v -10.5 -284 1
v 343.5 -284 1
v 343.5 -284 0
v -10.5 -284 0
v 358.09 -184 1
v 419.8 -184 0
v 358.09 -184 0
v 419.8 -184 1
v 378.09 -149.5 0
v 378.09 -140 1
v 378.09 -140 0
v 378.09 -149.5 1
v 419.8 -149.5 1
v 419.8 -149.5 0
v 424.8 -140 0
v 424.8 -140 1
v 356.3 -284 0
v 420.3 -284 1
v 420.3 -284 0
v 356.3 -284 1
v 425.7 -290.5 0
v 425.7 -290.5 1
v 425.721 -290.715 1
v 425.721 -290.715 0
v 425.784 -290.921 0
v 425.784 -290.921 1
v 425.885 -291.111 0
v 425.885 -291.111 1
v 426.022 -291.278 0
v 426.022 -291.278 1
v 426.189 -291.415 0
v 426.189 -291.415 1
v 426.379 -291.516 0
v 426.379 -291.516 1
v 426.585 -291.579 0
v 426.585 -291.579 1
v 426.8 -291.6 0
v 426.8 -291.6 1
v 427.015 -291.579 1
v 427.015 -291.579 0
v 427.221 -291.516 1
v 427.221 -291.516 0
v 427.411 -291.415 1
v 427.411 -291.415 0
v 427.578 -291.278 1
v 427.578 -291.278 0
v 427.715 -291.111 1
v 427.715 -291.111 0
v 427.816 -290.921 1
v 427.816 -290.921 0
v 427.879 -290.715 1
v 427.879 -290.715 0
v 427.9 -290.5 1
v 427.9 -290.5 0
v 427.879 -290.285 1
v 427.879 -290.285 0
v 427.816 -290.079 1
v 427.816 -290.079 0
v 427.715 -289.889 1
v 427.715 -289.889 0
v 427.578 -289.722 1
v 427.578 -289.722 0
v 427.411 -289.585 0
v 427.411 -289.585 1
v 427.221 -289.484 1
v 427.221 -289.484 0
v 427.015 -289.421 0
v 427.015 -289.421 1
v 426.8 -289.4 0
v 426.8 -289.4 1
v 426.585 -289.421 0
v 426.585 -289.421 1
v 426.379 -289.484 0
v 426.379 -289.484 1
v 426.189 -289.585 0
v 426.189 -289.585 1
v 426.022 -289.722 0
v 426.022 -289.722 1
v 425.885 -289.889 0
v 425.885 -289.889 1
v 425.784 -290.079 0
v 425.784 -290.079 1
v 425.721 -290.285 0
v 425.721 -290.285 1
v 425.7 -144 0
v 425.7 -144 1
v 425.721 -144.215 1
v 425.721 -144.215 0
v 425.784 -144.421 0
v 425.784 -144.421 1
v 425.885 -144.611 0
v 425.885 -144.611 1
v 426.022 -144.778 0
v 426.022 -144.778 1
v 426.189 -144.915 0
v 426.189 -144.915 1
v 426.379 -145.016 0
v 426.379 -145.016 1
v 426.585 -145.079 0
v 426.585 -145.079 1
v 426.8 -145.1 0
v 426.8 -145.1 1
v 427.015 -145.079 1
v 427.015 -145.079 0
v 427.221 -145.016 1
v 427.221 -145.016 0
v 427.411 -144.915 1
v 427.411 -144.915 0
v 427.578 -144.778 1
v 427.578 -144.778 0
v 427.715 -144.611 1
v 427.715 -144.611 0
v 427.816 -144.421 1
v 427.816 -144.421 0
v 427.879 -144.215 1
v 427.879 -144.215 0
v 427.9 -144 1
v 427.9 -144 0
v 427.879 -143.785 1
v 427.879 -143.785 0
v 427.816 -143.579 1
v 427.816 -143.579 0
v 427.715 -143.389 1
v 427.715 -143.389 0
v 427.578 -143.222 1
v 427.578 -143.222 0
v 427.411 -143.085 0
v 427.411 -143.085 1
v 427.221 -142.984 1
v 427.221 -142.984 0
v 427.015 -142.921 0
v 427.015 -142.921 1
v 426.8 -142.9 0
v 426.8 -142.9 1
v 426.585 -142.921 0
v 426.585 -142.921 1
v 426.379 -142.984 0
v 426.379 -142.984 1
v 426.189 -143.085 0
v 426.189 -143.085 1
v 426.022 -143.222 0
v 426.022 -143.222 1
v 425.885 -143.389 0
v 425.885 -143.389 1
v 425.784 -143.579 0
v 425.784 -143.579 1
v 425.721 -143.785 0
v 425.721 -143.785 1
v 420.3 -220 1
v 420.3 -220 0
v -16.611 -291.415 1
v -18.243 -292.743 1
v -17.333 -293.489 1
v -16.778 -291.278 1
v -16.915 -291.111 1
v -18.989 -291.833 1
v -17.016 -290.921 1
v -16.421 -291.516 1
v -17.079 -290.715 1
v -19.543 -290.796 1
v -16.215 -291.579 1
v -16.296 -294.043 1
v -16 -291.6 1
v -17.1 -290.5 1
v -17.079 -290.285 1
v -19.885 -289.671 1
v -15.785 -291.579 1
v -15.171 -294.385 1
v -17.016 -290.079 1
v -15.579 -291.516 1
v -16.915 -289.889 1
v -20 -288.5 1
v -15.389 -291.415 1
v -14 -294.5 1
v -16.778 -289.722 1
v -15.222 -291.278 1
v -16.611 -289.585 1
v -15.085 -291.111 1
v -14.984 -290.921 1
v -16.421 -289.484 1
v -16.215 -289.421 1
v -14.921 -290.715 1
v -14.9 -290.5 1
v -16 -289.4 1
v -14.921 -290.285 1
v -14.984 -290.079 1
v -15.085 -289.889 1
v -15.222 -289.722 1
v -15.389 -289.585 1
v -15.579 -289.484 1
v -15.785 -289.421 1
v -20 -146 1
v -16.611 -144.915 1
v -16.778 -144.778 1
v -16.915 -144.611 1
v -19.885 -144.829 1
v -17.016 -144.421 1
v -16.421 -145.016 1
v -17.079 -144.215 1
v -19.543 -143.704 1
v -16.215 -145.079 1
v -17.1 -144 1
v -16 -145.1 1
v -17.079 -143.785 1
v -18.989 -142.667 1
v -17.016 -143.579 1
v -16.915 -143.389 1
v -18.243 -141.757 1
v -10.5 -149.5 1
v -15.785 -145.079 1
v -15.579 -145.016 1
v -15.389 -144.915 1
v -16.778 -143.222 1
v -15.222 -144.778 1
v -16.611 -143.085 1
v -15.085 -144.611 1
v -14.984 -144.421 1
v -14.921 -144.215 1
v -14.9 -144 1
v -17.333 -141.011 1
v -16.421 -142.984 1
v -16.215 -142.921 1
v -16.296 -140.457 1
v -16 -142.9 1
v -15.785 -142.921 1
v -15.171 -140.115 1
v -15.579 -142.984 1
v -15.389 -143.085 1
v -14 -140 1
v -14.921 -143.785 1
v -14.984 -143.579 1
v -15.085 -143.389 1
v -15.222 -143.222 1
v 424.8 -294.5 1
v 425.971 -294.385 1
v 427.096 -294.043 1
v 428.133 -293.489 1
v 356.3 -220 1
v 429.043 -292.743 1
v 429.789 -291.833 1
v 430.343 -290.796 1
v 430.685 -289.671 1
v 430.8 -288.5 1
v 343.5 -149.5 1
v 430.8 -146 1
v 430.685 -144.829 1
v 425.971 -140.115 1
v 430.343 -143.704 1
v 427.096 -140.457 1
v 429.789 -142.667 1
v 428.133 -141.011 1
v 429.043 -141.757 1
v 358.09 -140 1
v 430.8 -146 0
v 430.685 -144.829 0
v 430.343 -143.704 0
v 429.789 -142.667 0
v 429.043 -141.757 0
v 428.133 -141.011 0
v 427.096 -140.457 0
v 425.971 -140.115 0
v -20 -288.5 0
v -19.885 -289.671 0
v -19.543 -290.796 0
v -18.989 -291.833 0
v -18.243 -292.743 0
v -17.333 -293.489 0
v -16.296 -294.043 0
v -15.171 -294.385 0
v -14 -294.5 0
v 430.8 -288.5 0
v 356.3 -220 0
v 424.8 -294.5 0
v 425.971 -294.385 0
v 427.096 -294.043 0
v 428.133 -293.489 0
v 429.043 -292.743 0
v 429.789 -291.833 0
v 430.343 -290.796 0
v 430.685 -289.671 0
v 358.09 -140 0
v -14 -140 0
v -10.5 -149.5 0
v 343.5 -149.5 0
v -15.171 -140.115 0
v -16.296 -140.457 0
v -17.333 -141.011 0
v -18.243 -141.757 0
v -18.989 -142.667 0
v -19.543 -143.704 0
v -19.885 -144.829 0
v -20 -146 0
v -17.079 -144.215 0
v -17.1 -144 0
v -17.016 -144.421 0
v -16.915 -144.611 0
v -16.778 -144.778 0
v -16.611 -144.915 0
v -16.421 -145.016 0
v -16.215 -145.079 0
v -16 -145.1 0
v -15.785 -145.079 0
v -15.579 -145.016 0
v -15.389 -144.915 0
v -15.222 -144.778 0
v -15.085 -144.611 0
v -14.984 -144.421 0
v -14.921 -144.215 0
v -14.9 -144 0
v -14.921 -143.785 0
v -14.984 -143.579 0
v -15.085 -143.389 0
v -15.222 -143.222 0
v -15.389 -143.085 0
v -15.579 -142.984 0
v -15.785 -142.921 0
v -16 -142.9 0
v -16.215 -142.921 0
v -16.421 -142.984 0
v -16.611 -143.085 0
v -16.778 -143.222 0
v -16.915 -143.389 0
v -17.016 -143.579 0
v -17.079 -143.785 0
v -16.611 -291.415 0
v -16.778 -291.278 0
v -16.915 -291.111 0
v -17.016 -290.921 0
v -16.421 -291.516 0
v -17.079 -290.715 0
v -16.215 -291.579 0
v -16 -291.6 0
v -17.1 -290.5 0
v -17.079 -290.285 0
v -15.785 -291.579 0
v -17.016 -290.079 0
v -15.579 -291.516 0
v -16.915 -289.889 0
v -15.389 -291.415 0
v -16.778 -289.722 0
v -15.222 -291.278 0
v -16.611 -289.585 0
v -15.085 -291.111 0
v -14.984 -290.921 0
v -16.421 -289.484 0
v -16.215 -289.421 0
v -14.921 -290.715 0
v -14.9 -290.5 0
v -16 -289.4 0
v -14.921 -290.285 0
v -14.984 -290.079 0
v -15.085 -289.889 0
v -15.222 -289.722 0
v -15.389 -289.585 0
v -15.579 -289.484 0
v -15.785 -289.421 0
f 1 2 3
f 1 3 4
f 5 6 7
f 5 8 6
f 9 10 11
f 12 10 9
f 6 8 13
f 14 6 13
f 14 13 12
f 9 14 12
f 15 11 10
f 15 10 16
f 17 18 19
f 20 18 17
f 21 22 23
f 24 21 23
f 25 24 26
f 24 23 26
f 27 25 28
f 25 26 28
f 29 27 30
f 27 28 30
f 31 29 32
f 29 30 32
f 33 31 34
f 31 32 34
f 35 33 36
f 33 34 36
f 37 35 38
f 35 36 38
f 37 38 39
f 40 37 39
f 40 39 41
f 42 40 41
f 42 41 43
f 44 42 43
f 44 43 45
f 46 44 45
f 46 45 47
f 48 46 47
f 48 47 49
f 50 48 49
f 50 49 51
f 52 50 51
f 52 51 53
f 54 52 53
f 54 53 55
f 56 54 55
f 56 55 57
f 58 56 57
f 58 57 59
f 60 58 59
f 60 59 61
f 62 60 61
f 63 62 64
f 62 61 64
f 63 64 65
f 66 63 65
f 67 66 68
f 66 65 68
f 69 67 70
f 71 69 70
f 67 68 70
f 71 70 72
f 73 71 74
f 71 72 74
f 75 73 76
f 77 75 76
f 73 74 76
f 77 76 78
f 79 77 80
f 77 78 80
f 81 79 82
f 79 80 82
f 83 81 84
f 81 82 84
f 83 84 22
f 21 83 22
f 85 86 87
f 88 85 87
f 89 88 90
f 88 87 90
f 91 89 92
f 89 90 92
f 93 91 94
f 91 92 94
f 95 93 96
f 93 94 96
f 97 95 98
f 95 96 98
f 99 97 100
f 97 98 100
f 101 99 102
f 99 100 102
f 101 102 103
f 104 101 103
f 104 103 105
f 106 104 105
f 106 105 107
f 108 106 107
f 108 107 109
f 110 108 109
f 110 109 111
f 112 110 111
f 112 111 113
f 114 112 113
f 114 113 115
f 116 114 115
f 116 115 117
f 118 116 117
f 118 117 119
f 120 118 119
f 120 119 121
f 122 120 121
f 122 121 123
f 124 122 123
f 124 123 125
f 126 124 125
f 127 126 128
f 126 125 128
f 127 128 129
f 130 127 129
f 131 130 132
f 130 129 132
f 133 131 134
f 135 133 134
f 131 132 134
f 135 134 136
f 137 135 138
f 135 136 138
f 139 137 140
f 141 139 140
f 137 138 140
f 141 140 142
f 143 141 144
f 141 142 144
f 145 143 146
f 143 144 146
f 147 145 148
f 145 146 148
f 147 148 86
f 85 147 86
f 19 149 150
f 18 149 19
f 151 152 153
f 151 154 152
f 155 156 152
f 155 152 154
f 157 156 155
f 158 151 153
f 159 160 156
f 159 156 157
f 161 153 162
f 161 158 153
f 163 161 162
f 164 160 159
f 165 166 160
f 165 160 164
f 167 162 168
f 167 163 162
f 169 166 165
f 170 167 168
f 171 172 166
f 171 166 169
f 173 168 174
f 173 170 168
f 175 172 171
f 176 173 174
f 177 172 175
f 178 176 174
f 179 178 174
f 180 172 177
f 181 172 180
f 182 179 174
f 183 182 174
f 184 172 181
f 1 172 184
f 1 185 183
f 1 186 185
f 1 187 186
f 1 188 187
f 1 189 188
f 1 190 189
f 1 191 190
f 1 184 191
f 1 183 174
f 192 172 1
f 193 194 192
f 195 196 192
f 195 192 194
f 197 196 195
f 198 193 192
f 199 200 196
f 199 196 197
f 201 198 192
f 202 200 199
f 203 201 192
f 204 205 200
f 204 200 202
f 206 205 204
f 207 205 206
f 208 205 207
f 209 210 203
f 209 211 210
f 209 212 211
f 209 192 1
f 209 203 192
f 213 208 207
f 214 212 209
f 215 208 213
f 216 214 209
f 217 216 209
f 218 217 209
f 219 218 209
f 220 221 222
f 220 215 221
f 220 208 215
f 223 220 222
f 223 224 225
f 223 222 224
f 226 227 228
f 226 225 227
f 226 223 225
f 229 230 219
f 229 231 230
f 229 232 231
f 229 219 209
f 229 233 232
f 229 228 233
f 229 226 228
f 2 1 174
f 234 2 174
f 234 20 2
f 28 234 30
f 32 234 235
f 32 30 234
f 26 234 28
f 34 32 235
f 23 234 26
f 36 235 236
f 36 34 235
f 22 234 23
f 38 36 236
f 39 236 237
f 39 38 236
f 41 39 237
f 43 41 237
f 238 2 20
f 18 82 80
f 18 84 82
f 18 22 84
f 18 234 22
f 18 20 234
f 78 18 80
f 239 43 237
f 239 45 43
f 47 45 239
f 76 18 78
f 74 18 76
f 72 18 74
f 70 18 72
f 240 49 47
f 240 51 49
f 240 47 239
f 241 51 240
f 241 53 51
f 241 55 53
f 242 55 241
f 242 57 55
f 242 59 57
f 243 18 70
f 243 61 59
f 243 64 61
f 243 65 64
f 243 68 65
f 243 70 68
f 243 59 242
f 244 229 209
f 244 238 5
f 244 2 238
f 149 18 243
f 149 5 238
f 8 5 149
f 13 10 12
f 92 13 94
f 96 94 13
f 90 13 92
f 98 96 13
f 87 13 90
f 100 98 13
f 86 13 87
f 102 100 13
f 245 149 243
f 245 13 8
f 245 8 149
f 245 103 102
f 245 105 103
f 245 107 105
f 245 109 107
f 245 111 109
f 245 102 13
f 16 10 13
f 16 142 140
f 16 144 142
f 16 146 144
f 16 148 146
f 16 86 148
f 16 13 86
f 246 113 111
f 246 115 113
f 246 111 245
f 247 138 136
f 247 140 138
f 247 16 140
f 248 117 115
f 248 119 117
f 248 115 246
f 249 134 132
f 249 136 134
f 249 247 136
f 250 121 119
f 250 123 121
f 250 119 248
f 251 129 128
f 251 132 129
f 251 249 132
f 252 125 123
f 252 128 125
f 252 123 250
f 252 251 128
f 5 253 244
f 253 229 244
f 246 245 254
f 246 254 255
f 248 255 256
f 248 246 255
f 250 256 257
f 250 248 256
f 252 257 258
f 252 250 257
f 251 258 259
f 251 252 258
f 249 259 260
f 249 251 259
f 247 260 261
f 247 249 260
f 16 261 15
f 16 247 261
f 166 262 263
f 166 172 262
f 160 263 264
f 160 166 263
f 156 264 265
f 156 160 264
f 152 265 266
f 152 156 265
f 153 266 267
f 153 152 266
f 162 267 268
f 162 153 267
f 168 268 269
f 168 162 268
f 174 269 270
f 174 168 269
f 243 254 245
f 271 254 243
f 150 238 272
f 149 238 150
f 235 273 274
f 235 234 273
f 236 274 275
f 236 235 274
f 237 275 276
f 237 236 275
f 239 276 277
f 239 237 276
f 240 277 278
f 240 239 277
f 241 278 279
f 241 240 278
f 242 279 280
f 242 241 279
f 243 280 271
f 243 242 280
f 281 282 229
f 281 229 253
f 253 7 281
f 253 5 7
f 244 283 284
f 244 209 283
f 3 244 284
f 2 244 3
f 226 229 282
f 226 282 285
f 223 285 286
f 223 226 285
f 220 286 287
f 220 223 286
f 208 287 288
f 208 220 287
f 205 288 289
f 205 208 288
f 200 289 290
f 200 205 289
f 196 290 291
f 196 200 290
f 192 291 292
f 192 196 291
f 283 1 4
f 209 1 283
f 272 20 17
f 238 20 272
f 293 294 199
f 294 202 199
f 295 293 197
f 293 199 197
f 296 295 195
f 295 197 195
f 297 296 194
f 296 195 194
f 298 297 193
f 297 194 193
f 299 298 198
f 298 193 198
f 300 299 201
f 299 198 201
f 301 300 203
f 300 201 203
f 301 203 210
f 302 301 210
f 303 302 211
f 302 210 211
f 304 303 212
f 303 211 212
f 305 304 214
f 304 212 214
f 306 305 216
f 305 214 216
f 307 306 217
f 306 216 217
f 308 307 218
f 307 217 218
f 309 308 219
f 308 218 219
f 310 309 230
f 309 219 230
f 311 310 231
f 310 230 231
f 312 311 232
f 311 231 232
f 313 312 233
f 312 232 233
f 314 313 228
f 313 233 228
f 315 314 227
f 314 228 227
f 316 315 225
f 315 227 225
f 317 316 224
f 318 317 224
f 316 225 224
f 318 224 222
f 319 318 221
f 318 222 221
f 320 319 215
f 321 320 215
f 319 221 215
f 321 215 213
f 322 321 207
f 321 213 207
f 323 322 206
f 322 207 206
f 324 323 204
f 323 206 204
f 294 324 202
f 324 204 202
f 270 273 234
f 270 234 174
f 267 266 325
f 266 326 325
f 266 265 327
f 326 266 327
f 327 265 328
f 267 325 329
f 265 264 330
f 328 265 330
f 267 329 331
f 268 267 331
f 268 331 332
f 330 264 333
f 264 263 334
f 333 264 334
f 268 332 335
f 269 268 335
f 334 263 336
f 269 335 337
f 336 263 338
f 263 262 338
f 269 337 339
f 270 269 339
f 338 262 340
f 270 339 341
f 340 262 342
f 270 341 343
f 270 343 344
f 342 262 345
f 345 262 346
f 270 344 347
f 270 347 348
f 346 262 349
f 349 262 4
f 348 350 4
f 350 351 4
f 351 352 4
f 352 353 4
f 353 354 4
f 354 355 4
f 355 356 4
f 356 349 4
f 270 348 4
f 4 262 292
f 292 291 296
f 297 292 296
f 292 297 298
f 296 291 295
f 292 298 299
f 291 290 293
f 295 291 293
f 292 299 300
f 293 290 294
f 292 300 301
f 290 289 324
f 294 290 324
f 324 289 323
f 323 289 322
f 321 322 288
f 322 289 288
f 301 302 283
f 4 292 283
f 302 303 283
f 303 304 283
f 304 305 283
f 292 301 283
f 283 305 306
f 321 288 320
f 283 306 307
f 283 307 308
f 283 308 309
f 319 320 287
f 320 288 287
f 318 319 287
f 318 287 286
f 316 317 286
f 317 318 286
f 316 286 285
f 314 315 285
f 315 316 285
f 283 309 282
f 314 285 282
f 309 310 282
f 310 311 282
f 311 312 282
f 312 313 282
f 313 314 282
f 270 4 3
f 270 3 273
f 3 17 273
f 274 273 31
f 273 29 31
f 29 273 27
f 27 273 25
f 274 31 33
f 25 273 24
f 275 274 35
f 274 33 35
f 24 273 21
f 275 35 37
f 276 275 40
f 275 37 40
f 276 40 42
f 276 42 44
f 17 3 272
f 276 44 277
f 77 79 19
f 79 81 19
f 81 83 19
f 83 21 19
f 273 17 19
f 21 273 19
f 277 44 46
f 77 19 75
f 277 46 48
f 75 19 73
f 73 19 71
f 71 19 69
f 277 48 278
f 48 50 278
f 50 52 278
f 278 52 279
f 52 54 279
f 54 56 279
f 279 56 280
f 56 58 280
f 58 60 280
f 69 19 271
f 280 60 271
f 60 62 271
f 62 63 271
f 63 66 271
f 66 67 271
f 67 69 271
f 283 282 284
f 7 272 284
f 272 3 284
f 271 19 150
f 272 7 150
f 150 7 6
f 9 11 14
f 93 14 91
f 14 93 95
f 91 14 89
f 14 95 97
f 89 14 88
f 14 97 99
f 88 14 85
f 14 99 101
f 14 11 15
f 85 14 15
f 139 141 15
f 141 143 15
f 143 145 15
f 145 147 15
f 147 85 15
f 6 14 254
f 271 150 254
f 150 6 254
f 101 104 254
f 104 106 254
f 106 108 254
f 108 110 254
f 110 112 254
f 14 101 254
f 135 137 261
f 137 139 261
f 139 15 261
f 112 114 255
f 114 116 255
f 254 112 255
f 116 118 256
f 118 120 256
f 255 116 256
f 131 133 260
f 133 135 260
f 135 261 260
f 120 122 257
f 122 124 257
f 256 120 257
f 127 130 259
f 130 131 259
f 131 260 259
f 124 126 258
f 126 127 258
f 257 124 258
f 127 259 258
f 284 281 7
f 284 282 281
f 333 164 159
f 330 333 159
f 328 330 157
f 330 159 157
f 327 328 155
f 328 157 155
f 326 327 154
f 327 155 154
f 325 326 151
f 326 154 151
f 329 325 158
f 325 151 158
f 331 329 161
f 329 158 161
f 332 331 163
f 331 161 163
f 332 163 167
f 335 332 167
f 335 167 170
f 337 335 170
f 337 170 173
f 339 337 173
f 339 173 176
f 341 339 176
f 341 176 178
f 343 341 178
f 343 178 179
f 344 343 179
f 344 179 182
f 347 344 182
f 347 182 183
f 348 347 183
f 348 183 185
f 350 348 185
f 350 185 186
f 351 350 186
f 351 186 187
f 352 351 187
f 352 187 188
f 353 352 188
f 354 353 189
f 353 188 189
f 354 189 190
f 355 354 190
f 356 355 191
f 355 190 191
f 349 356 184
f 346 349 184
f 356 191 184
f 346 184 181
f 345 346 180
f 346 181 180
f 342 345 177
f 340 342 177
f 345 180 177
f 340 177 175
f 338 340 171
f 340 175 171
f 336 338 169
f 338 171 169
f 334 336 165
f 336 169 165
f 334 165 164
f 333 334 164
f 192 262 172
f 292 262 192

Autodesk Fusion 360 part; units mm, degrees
sketch "Sketch6" plane through (0, 0, 0) normal (0, 0, 1) x (1, 0, 0)
  line L0 (-20, -140) -> (430.8, -140)
  line L1 (430.8, -140) -> (430.8, -294.5)
  line L2 (430.8, -294.5) -> (-20, -294.5)
  line L3 (-20, -294.5) -> (-20, -140)
  dimension "d40" = 450.8
  dimension "d41" = 154.5
extrude "Extrude8" add sketch "Sketch6" along normal blind 1
sketch "Sketch7" plane through (0, 0, 1) normal (0, 0, 1) x (-1, 0, 0)
  line L0 (20, 294.5) -> (-430.8, 294.5)
  line L1 (-430.8, 294.5) -> (-430.8, 140)
  line L2 (-430.8, 140) -> (20, 140)
  line L3 (20, 140) -> (20, 294.5)
  line L4 (-358.09, 140) -> (-378.09, 140)
  line L5 (-378.09, 140) -> (-378.09, 184)
  line L6 (-378.09, 184) -> (-358.09, 184)
  line L7 (-358.09, 184) -> (-358.09, 140)
  line L8 (-378.09, 184) -> (-419.8, 184)
  line L9 (-419.8, 184) -> (-419.8, 149.5)
  line L10 (-419.8, 149.5) -> (-378.09, 149.5)
  line L11 (-378.09, 149.5) -> (-378.09, 184)
  line L12 (10.5, 149.5) -> (-343.5, 149.5)
  line L13 (-343.5, 149.5) -> (-343.5, 284)
  line L14 (-343.5, 284) -> (10.5, 284)
  line L15 (10.5, 284) -> (10.5, 149.5)
  line L16 (-356.3, 220) -> (-420.3, 220)
  line L17 (-420.3, 220) -> (-420.3, 284)
  line L18 (-420.3, 284) -> (-356.3, 284)
  line L19 (-356.3, 284) -> (-356.3, 220)
  circle A0 centre (-426.8, 144) radius 1.1
  circle A1 centre (-426.8, 290.5) radius 1.1
  circle A2 centre (16, 290.5) radius 1.1
  circle A3 centre (16, 144) radius 1.1
  dimension "d46" = 20
  dimension "d47" = 44
  dimension "d48" = 52.71
  dimension "d51" = 41.71
  dimension "d52" = 34.5
  dimension "d55" = 354
  dimension "d56" = 134.5
  dimension "d57" = 9.5
  dimension "d58" = 9.5
  dimension "d59" = 64
  dimension "d60" = 64
  dimension "d61" = 10.5
  dimension "d62" = 10.5
  dimension "d67" = 2.2
  dimension "d68" = 2.2
  dimension "d69" = 2.2
  dimension "d70" = 2.2
  dimension "d71" = 4
  dimension "d72" = 4
  dimension "d73" = 4
  dimension "d74" = 4
  dimension "d75" = 4
  dimension "d76" = 4
  dimension "d77" = 4
  dimension "d78" = 4
extrude "Extrude9" cut sketch "Sketch7" against normal blind 1 contours L2 L4 L5 L6 L7 L11
extrude "Extrude10" cut sketch "Sketch7" against normal blind 1 contours L5 L8 L9 L10 L11
extrude "Extrude11" cut sketch "Sketch7" against normal blind 1 contours L12 L13 L14 L15 | L16 L17 L18 L19
fillet "Fillet6" radius 6 4 edges at (-20, -294.5, 0.5) (-20, -140, 0.5) (430.8, -140, 0.5) (430.8, -294.5, 0.5)
extrude "Extrude12" cut sketch "Sketch7" against normal blind 1 contours A0 | A1 | A2 | A3
equation "d51 = 52.210 mm - 10.50 mm"
equation "d52 = 44 mm - 9.5 mm"
